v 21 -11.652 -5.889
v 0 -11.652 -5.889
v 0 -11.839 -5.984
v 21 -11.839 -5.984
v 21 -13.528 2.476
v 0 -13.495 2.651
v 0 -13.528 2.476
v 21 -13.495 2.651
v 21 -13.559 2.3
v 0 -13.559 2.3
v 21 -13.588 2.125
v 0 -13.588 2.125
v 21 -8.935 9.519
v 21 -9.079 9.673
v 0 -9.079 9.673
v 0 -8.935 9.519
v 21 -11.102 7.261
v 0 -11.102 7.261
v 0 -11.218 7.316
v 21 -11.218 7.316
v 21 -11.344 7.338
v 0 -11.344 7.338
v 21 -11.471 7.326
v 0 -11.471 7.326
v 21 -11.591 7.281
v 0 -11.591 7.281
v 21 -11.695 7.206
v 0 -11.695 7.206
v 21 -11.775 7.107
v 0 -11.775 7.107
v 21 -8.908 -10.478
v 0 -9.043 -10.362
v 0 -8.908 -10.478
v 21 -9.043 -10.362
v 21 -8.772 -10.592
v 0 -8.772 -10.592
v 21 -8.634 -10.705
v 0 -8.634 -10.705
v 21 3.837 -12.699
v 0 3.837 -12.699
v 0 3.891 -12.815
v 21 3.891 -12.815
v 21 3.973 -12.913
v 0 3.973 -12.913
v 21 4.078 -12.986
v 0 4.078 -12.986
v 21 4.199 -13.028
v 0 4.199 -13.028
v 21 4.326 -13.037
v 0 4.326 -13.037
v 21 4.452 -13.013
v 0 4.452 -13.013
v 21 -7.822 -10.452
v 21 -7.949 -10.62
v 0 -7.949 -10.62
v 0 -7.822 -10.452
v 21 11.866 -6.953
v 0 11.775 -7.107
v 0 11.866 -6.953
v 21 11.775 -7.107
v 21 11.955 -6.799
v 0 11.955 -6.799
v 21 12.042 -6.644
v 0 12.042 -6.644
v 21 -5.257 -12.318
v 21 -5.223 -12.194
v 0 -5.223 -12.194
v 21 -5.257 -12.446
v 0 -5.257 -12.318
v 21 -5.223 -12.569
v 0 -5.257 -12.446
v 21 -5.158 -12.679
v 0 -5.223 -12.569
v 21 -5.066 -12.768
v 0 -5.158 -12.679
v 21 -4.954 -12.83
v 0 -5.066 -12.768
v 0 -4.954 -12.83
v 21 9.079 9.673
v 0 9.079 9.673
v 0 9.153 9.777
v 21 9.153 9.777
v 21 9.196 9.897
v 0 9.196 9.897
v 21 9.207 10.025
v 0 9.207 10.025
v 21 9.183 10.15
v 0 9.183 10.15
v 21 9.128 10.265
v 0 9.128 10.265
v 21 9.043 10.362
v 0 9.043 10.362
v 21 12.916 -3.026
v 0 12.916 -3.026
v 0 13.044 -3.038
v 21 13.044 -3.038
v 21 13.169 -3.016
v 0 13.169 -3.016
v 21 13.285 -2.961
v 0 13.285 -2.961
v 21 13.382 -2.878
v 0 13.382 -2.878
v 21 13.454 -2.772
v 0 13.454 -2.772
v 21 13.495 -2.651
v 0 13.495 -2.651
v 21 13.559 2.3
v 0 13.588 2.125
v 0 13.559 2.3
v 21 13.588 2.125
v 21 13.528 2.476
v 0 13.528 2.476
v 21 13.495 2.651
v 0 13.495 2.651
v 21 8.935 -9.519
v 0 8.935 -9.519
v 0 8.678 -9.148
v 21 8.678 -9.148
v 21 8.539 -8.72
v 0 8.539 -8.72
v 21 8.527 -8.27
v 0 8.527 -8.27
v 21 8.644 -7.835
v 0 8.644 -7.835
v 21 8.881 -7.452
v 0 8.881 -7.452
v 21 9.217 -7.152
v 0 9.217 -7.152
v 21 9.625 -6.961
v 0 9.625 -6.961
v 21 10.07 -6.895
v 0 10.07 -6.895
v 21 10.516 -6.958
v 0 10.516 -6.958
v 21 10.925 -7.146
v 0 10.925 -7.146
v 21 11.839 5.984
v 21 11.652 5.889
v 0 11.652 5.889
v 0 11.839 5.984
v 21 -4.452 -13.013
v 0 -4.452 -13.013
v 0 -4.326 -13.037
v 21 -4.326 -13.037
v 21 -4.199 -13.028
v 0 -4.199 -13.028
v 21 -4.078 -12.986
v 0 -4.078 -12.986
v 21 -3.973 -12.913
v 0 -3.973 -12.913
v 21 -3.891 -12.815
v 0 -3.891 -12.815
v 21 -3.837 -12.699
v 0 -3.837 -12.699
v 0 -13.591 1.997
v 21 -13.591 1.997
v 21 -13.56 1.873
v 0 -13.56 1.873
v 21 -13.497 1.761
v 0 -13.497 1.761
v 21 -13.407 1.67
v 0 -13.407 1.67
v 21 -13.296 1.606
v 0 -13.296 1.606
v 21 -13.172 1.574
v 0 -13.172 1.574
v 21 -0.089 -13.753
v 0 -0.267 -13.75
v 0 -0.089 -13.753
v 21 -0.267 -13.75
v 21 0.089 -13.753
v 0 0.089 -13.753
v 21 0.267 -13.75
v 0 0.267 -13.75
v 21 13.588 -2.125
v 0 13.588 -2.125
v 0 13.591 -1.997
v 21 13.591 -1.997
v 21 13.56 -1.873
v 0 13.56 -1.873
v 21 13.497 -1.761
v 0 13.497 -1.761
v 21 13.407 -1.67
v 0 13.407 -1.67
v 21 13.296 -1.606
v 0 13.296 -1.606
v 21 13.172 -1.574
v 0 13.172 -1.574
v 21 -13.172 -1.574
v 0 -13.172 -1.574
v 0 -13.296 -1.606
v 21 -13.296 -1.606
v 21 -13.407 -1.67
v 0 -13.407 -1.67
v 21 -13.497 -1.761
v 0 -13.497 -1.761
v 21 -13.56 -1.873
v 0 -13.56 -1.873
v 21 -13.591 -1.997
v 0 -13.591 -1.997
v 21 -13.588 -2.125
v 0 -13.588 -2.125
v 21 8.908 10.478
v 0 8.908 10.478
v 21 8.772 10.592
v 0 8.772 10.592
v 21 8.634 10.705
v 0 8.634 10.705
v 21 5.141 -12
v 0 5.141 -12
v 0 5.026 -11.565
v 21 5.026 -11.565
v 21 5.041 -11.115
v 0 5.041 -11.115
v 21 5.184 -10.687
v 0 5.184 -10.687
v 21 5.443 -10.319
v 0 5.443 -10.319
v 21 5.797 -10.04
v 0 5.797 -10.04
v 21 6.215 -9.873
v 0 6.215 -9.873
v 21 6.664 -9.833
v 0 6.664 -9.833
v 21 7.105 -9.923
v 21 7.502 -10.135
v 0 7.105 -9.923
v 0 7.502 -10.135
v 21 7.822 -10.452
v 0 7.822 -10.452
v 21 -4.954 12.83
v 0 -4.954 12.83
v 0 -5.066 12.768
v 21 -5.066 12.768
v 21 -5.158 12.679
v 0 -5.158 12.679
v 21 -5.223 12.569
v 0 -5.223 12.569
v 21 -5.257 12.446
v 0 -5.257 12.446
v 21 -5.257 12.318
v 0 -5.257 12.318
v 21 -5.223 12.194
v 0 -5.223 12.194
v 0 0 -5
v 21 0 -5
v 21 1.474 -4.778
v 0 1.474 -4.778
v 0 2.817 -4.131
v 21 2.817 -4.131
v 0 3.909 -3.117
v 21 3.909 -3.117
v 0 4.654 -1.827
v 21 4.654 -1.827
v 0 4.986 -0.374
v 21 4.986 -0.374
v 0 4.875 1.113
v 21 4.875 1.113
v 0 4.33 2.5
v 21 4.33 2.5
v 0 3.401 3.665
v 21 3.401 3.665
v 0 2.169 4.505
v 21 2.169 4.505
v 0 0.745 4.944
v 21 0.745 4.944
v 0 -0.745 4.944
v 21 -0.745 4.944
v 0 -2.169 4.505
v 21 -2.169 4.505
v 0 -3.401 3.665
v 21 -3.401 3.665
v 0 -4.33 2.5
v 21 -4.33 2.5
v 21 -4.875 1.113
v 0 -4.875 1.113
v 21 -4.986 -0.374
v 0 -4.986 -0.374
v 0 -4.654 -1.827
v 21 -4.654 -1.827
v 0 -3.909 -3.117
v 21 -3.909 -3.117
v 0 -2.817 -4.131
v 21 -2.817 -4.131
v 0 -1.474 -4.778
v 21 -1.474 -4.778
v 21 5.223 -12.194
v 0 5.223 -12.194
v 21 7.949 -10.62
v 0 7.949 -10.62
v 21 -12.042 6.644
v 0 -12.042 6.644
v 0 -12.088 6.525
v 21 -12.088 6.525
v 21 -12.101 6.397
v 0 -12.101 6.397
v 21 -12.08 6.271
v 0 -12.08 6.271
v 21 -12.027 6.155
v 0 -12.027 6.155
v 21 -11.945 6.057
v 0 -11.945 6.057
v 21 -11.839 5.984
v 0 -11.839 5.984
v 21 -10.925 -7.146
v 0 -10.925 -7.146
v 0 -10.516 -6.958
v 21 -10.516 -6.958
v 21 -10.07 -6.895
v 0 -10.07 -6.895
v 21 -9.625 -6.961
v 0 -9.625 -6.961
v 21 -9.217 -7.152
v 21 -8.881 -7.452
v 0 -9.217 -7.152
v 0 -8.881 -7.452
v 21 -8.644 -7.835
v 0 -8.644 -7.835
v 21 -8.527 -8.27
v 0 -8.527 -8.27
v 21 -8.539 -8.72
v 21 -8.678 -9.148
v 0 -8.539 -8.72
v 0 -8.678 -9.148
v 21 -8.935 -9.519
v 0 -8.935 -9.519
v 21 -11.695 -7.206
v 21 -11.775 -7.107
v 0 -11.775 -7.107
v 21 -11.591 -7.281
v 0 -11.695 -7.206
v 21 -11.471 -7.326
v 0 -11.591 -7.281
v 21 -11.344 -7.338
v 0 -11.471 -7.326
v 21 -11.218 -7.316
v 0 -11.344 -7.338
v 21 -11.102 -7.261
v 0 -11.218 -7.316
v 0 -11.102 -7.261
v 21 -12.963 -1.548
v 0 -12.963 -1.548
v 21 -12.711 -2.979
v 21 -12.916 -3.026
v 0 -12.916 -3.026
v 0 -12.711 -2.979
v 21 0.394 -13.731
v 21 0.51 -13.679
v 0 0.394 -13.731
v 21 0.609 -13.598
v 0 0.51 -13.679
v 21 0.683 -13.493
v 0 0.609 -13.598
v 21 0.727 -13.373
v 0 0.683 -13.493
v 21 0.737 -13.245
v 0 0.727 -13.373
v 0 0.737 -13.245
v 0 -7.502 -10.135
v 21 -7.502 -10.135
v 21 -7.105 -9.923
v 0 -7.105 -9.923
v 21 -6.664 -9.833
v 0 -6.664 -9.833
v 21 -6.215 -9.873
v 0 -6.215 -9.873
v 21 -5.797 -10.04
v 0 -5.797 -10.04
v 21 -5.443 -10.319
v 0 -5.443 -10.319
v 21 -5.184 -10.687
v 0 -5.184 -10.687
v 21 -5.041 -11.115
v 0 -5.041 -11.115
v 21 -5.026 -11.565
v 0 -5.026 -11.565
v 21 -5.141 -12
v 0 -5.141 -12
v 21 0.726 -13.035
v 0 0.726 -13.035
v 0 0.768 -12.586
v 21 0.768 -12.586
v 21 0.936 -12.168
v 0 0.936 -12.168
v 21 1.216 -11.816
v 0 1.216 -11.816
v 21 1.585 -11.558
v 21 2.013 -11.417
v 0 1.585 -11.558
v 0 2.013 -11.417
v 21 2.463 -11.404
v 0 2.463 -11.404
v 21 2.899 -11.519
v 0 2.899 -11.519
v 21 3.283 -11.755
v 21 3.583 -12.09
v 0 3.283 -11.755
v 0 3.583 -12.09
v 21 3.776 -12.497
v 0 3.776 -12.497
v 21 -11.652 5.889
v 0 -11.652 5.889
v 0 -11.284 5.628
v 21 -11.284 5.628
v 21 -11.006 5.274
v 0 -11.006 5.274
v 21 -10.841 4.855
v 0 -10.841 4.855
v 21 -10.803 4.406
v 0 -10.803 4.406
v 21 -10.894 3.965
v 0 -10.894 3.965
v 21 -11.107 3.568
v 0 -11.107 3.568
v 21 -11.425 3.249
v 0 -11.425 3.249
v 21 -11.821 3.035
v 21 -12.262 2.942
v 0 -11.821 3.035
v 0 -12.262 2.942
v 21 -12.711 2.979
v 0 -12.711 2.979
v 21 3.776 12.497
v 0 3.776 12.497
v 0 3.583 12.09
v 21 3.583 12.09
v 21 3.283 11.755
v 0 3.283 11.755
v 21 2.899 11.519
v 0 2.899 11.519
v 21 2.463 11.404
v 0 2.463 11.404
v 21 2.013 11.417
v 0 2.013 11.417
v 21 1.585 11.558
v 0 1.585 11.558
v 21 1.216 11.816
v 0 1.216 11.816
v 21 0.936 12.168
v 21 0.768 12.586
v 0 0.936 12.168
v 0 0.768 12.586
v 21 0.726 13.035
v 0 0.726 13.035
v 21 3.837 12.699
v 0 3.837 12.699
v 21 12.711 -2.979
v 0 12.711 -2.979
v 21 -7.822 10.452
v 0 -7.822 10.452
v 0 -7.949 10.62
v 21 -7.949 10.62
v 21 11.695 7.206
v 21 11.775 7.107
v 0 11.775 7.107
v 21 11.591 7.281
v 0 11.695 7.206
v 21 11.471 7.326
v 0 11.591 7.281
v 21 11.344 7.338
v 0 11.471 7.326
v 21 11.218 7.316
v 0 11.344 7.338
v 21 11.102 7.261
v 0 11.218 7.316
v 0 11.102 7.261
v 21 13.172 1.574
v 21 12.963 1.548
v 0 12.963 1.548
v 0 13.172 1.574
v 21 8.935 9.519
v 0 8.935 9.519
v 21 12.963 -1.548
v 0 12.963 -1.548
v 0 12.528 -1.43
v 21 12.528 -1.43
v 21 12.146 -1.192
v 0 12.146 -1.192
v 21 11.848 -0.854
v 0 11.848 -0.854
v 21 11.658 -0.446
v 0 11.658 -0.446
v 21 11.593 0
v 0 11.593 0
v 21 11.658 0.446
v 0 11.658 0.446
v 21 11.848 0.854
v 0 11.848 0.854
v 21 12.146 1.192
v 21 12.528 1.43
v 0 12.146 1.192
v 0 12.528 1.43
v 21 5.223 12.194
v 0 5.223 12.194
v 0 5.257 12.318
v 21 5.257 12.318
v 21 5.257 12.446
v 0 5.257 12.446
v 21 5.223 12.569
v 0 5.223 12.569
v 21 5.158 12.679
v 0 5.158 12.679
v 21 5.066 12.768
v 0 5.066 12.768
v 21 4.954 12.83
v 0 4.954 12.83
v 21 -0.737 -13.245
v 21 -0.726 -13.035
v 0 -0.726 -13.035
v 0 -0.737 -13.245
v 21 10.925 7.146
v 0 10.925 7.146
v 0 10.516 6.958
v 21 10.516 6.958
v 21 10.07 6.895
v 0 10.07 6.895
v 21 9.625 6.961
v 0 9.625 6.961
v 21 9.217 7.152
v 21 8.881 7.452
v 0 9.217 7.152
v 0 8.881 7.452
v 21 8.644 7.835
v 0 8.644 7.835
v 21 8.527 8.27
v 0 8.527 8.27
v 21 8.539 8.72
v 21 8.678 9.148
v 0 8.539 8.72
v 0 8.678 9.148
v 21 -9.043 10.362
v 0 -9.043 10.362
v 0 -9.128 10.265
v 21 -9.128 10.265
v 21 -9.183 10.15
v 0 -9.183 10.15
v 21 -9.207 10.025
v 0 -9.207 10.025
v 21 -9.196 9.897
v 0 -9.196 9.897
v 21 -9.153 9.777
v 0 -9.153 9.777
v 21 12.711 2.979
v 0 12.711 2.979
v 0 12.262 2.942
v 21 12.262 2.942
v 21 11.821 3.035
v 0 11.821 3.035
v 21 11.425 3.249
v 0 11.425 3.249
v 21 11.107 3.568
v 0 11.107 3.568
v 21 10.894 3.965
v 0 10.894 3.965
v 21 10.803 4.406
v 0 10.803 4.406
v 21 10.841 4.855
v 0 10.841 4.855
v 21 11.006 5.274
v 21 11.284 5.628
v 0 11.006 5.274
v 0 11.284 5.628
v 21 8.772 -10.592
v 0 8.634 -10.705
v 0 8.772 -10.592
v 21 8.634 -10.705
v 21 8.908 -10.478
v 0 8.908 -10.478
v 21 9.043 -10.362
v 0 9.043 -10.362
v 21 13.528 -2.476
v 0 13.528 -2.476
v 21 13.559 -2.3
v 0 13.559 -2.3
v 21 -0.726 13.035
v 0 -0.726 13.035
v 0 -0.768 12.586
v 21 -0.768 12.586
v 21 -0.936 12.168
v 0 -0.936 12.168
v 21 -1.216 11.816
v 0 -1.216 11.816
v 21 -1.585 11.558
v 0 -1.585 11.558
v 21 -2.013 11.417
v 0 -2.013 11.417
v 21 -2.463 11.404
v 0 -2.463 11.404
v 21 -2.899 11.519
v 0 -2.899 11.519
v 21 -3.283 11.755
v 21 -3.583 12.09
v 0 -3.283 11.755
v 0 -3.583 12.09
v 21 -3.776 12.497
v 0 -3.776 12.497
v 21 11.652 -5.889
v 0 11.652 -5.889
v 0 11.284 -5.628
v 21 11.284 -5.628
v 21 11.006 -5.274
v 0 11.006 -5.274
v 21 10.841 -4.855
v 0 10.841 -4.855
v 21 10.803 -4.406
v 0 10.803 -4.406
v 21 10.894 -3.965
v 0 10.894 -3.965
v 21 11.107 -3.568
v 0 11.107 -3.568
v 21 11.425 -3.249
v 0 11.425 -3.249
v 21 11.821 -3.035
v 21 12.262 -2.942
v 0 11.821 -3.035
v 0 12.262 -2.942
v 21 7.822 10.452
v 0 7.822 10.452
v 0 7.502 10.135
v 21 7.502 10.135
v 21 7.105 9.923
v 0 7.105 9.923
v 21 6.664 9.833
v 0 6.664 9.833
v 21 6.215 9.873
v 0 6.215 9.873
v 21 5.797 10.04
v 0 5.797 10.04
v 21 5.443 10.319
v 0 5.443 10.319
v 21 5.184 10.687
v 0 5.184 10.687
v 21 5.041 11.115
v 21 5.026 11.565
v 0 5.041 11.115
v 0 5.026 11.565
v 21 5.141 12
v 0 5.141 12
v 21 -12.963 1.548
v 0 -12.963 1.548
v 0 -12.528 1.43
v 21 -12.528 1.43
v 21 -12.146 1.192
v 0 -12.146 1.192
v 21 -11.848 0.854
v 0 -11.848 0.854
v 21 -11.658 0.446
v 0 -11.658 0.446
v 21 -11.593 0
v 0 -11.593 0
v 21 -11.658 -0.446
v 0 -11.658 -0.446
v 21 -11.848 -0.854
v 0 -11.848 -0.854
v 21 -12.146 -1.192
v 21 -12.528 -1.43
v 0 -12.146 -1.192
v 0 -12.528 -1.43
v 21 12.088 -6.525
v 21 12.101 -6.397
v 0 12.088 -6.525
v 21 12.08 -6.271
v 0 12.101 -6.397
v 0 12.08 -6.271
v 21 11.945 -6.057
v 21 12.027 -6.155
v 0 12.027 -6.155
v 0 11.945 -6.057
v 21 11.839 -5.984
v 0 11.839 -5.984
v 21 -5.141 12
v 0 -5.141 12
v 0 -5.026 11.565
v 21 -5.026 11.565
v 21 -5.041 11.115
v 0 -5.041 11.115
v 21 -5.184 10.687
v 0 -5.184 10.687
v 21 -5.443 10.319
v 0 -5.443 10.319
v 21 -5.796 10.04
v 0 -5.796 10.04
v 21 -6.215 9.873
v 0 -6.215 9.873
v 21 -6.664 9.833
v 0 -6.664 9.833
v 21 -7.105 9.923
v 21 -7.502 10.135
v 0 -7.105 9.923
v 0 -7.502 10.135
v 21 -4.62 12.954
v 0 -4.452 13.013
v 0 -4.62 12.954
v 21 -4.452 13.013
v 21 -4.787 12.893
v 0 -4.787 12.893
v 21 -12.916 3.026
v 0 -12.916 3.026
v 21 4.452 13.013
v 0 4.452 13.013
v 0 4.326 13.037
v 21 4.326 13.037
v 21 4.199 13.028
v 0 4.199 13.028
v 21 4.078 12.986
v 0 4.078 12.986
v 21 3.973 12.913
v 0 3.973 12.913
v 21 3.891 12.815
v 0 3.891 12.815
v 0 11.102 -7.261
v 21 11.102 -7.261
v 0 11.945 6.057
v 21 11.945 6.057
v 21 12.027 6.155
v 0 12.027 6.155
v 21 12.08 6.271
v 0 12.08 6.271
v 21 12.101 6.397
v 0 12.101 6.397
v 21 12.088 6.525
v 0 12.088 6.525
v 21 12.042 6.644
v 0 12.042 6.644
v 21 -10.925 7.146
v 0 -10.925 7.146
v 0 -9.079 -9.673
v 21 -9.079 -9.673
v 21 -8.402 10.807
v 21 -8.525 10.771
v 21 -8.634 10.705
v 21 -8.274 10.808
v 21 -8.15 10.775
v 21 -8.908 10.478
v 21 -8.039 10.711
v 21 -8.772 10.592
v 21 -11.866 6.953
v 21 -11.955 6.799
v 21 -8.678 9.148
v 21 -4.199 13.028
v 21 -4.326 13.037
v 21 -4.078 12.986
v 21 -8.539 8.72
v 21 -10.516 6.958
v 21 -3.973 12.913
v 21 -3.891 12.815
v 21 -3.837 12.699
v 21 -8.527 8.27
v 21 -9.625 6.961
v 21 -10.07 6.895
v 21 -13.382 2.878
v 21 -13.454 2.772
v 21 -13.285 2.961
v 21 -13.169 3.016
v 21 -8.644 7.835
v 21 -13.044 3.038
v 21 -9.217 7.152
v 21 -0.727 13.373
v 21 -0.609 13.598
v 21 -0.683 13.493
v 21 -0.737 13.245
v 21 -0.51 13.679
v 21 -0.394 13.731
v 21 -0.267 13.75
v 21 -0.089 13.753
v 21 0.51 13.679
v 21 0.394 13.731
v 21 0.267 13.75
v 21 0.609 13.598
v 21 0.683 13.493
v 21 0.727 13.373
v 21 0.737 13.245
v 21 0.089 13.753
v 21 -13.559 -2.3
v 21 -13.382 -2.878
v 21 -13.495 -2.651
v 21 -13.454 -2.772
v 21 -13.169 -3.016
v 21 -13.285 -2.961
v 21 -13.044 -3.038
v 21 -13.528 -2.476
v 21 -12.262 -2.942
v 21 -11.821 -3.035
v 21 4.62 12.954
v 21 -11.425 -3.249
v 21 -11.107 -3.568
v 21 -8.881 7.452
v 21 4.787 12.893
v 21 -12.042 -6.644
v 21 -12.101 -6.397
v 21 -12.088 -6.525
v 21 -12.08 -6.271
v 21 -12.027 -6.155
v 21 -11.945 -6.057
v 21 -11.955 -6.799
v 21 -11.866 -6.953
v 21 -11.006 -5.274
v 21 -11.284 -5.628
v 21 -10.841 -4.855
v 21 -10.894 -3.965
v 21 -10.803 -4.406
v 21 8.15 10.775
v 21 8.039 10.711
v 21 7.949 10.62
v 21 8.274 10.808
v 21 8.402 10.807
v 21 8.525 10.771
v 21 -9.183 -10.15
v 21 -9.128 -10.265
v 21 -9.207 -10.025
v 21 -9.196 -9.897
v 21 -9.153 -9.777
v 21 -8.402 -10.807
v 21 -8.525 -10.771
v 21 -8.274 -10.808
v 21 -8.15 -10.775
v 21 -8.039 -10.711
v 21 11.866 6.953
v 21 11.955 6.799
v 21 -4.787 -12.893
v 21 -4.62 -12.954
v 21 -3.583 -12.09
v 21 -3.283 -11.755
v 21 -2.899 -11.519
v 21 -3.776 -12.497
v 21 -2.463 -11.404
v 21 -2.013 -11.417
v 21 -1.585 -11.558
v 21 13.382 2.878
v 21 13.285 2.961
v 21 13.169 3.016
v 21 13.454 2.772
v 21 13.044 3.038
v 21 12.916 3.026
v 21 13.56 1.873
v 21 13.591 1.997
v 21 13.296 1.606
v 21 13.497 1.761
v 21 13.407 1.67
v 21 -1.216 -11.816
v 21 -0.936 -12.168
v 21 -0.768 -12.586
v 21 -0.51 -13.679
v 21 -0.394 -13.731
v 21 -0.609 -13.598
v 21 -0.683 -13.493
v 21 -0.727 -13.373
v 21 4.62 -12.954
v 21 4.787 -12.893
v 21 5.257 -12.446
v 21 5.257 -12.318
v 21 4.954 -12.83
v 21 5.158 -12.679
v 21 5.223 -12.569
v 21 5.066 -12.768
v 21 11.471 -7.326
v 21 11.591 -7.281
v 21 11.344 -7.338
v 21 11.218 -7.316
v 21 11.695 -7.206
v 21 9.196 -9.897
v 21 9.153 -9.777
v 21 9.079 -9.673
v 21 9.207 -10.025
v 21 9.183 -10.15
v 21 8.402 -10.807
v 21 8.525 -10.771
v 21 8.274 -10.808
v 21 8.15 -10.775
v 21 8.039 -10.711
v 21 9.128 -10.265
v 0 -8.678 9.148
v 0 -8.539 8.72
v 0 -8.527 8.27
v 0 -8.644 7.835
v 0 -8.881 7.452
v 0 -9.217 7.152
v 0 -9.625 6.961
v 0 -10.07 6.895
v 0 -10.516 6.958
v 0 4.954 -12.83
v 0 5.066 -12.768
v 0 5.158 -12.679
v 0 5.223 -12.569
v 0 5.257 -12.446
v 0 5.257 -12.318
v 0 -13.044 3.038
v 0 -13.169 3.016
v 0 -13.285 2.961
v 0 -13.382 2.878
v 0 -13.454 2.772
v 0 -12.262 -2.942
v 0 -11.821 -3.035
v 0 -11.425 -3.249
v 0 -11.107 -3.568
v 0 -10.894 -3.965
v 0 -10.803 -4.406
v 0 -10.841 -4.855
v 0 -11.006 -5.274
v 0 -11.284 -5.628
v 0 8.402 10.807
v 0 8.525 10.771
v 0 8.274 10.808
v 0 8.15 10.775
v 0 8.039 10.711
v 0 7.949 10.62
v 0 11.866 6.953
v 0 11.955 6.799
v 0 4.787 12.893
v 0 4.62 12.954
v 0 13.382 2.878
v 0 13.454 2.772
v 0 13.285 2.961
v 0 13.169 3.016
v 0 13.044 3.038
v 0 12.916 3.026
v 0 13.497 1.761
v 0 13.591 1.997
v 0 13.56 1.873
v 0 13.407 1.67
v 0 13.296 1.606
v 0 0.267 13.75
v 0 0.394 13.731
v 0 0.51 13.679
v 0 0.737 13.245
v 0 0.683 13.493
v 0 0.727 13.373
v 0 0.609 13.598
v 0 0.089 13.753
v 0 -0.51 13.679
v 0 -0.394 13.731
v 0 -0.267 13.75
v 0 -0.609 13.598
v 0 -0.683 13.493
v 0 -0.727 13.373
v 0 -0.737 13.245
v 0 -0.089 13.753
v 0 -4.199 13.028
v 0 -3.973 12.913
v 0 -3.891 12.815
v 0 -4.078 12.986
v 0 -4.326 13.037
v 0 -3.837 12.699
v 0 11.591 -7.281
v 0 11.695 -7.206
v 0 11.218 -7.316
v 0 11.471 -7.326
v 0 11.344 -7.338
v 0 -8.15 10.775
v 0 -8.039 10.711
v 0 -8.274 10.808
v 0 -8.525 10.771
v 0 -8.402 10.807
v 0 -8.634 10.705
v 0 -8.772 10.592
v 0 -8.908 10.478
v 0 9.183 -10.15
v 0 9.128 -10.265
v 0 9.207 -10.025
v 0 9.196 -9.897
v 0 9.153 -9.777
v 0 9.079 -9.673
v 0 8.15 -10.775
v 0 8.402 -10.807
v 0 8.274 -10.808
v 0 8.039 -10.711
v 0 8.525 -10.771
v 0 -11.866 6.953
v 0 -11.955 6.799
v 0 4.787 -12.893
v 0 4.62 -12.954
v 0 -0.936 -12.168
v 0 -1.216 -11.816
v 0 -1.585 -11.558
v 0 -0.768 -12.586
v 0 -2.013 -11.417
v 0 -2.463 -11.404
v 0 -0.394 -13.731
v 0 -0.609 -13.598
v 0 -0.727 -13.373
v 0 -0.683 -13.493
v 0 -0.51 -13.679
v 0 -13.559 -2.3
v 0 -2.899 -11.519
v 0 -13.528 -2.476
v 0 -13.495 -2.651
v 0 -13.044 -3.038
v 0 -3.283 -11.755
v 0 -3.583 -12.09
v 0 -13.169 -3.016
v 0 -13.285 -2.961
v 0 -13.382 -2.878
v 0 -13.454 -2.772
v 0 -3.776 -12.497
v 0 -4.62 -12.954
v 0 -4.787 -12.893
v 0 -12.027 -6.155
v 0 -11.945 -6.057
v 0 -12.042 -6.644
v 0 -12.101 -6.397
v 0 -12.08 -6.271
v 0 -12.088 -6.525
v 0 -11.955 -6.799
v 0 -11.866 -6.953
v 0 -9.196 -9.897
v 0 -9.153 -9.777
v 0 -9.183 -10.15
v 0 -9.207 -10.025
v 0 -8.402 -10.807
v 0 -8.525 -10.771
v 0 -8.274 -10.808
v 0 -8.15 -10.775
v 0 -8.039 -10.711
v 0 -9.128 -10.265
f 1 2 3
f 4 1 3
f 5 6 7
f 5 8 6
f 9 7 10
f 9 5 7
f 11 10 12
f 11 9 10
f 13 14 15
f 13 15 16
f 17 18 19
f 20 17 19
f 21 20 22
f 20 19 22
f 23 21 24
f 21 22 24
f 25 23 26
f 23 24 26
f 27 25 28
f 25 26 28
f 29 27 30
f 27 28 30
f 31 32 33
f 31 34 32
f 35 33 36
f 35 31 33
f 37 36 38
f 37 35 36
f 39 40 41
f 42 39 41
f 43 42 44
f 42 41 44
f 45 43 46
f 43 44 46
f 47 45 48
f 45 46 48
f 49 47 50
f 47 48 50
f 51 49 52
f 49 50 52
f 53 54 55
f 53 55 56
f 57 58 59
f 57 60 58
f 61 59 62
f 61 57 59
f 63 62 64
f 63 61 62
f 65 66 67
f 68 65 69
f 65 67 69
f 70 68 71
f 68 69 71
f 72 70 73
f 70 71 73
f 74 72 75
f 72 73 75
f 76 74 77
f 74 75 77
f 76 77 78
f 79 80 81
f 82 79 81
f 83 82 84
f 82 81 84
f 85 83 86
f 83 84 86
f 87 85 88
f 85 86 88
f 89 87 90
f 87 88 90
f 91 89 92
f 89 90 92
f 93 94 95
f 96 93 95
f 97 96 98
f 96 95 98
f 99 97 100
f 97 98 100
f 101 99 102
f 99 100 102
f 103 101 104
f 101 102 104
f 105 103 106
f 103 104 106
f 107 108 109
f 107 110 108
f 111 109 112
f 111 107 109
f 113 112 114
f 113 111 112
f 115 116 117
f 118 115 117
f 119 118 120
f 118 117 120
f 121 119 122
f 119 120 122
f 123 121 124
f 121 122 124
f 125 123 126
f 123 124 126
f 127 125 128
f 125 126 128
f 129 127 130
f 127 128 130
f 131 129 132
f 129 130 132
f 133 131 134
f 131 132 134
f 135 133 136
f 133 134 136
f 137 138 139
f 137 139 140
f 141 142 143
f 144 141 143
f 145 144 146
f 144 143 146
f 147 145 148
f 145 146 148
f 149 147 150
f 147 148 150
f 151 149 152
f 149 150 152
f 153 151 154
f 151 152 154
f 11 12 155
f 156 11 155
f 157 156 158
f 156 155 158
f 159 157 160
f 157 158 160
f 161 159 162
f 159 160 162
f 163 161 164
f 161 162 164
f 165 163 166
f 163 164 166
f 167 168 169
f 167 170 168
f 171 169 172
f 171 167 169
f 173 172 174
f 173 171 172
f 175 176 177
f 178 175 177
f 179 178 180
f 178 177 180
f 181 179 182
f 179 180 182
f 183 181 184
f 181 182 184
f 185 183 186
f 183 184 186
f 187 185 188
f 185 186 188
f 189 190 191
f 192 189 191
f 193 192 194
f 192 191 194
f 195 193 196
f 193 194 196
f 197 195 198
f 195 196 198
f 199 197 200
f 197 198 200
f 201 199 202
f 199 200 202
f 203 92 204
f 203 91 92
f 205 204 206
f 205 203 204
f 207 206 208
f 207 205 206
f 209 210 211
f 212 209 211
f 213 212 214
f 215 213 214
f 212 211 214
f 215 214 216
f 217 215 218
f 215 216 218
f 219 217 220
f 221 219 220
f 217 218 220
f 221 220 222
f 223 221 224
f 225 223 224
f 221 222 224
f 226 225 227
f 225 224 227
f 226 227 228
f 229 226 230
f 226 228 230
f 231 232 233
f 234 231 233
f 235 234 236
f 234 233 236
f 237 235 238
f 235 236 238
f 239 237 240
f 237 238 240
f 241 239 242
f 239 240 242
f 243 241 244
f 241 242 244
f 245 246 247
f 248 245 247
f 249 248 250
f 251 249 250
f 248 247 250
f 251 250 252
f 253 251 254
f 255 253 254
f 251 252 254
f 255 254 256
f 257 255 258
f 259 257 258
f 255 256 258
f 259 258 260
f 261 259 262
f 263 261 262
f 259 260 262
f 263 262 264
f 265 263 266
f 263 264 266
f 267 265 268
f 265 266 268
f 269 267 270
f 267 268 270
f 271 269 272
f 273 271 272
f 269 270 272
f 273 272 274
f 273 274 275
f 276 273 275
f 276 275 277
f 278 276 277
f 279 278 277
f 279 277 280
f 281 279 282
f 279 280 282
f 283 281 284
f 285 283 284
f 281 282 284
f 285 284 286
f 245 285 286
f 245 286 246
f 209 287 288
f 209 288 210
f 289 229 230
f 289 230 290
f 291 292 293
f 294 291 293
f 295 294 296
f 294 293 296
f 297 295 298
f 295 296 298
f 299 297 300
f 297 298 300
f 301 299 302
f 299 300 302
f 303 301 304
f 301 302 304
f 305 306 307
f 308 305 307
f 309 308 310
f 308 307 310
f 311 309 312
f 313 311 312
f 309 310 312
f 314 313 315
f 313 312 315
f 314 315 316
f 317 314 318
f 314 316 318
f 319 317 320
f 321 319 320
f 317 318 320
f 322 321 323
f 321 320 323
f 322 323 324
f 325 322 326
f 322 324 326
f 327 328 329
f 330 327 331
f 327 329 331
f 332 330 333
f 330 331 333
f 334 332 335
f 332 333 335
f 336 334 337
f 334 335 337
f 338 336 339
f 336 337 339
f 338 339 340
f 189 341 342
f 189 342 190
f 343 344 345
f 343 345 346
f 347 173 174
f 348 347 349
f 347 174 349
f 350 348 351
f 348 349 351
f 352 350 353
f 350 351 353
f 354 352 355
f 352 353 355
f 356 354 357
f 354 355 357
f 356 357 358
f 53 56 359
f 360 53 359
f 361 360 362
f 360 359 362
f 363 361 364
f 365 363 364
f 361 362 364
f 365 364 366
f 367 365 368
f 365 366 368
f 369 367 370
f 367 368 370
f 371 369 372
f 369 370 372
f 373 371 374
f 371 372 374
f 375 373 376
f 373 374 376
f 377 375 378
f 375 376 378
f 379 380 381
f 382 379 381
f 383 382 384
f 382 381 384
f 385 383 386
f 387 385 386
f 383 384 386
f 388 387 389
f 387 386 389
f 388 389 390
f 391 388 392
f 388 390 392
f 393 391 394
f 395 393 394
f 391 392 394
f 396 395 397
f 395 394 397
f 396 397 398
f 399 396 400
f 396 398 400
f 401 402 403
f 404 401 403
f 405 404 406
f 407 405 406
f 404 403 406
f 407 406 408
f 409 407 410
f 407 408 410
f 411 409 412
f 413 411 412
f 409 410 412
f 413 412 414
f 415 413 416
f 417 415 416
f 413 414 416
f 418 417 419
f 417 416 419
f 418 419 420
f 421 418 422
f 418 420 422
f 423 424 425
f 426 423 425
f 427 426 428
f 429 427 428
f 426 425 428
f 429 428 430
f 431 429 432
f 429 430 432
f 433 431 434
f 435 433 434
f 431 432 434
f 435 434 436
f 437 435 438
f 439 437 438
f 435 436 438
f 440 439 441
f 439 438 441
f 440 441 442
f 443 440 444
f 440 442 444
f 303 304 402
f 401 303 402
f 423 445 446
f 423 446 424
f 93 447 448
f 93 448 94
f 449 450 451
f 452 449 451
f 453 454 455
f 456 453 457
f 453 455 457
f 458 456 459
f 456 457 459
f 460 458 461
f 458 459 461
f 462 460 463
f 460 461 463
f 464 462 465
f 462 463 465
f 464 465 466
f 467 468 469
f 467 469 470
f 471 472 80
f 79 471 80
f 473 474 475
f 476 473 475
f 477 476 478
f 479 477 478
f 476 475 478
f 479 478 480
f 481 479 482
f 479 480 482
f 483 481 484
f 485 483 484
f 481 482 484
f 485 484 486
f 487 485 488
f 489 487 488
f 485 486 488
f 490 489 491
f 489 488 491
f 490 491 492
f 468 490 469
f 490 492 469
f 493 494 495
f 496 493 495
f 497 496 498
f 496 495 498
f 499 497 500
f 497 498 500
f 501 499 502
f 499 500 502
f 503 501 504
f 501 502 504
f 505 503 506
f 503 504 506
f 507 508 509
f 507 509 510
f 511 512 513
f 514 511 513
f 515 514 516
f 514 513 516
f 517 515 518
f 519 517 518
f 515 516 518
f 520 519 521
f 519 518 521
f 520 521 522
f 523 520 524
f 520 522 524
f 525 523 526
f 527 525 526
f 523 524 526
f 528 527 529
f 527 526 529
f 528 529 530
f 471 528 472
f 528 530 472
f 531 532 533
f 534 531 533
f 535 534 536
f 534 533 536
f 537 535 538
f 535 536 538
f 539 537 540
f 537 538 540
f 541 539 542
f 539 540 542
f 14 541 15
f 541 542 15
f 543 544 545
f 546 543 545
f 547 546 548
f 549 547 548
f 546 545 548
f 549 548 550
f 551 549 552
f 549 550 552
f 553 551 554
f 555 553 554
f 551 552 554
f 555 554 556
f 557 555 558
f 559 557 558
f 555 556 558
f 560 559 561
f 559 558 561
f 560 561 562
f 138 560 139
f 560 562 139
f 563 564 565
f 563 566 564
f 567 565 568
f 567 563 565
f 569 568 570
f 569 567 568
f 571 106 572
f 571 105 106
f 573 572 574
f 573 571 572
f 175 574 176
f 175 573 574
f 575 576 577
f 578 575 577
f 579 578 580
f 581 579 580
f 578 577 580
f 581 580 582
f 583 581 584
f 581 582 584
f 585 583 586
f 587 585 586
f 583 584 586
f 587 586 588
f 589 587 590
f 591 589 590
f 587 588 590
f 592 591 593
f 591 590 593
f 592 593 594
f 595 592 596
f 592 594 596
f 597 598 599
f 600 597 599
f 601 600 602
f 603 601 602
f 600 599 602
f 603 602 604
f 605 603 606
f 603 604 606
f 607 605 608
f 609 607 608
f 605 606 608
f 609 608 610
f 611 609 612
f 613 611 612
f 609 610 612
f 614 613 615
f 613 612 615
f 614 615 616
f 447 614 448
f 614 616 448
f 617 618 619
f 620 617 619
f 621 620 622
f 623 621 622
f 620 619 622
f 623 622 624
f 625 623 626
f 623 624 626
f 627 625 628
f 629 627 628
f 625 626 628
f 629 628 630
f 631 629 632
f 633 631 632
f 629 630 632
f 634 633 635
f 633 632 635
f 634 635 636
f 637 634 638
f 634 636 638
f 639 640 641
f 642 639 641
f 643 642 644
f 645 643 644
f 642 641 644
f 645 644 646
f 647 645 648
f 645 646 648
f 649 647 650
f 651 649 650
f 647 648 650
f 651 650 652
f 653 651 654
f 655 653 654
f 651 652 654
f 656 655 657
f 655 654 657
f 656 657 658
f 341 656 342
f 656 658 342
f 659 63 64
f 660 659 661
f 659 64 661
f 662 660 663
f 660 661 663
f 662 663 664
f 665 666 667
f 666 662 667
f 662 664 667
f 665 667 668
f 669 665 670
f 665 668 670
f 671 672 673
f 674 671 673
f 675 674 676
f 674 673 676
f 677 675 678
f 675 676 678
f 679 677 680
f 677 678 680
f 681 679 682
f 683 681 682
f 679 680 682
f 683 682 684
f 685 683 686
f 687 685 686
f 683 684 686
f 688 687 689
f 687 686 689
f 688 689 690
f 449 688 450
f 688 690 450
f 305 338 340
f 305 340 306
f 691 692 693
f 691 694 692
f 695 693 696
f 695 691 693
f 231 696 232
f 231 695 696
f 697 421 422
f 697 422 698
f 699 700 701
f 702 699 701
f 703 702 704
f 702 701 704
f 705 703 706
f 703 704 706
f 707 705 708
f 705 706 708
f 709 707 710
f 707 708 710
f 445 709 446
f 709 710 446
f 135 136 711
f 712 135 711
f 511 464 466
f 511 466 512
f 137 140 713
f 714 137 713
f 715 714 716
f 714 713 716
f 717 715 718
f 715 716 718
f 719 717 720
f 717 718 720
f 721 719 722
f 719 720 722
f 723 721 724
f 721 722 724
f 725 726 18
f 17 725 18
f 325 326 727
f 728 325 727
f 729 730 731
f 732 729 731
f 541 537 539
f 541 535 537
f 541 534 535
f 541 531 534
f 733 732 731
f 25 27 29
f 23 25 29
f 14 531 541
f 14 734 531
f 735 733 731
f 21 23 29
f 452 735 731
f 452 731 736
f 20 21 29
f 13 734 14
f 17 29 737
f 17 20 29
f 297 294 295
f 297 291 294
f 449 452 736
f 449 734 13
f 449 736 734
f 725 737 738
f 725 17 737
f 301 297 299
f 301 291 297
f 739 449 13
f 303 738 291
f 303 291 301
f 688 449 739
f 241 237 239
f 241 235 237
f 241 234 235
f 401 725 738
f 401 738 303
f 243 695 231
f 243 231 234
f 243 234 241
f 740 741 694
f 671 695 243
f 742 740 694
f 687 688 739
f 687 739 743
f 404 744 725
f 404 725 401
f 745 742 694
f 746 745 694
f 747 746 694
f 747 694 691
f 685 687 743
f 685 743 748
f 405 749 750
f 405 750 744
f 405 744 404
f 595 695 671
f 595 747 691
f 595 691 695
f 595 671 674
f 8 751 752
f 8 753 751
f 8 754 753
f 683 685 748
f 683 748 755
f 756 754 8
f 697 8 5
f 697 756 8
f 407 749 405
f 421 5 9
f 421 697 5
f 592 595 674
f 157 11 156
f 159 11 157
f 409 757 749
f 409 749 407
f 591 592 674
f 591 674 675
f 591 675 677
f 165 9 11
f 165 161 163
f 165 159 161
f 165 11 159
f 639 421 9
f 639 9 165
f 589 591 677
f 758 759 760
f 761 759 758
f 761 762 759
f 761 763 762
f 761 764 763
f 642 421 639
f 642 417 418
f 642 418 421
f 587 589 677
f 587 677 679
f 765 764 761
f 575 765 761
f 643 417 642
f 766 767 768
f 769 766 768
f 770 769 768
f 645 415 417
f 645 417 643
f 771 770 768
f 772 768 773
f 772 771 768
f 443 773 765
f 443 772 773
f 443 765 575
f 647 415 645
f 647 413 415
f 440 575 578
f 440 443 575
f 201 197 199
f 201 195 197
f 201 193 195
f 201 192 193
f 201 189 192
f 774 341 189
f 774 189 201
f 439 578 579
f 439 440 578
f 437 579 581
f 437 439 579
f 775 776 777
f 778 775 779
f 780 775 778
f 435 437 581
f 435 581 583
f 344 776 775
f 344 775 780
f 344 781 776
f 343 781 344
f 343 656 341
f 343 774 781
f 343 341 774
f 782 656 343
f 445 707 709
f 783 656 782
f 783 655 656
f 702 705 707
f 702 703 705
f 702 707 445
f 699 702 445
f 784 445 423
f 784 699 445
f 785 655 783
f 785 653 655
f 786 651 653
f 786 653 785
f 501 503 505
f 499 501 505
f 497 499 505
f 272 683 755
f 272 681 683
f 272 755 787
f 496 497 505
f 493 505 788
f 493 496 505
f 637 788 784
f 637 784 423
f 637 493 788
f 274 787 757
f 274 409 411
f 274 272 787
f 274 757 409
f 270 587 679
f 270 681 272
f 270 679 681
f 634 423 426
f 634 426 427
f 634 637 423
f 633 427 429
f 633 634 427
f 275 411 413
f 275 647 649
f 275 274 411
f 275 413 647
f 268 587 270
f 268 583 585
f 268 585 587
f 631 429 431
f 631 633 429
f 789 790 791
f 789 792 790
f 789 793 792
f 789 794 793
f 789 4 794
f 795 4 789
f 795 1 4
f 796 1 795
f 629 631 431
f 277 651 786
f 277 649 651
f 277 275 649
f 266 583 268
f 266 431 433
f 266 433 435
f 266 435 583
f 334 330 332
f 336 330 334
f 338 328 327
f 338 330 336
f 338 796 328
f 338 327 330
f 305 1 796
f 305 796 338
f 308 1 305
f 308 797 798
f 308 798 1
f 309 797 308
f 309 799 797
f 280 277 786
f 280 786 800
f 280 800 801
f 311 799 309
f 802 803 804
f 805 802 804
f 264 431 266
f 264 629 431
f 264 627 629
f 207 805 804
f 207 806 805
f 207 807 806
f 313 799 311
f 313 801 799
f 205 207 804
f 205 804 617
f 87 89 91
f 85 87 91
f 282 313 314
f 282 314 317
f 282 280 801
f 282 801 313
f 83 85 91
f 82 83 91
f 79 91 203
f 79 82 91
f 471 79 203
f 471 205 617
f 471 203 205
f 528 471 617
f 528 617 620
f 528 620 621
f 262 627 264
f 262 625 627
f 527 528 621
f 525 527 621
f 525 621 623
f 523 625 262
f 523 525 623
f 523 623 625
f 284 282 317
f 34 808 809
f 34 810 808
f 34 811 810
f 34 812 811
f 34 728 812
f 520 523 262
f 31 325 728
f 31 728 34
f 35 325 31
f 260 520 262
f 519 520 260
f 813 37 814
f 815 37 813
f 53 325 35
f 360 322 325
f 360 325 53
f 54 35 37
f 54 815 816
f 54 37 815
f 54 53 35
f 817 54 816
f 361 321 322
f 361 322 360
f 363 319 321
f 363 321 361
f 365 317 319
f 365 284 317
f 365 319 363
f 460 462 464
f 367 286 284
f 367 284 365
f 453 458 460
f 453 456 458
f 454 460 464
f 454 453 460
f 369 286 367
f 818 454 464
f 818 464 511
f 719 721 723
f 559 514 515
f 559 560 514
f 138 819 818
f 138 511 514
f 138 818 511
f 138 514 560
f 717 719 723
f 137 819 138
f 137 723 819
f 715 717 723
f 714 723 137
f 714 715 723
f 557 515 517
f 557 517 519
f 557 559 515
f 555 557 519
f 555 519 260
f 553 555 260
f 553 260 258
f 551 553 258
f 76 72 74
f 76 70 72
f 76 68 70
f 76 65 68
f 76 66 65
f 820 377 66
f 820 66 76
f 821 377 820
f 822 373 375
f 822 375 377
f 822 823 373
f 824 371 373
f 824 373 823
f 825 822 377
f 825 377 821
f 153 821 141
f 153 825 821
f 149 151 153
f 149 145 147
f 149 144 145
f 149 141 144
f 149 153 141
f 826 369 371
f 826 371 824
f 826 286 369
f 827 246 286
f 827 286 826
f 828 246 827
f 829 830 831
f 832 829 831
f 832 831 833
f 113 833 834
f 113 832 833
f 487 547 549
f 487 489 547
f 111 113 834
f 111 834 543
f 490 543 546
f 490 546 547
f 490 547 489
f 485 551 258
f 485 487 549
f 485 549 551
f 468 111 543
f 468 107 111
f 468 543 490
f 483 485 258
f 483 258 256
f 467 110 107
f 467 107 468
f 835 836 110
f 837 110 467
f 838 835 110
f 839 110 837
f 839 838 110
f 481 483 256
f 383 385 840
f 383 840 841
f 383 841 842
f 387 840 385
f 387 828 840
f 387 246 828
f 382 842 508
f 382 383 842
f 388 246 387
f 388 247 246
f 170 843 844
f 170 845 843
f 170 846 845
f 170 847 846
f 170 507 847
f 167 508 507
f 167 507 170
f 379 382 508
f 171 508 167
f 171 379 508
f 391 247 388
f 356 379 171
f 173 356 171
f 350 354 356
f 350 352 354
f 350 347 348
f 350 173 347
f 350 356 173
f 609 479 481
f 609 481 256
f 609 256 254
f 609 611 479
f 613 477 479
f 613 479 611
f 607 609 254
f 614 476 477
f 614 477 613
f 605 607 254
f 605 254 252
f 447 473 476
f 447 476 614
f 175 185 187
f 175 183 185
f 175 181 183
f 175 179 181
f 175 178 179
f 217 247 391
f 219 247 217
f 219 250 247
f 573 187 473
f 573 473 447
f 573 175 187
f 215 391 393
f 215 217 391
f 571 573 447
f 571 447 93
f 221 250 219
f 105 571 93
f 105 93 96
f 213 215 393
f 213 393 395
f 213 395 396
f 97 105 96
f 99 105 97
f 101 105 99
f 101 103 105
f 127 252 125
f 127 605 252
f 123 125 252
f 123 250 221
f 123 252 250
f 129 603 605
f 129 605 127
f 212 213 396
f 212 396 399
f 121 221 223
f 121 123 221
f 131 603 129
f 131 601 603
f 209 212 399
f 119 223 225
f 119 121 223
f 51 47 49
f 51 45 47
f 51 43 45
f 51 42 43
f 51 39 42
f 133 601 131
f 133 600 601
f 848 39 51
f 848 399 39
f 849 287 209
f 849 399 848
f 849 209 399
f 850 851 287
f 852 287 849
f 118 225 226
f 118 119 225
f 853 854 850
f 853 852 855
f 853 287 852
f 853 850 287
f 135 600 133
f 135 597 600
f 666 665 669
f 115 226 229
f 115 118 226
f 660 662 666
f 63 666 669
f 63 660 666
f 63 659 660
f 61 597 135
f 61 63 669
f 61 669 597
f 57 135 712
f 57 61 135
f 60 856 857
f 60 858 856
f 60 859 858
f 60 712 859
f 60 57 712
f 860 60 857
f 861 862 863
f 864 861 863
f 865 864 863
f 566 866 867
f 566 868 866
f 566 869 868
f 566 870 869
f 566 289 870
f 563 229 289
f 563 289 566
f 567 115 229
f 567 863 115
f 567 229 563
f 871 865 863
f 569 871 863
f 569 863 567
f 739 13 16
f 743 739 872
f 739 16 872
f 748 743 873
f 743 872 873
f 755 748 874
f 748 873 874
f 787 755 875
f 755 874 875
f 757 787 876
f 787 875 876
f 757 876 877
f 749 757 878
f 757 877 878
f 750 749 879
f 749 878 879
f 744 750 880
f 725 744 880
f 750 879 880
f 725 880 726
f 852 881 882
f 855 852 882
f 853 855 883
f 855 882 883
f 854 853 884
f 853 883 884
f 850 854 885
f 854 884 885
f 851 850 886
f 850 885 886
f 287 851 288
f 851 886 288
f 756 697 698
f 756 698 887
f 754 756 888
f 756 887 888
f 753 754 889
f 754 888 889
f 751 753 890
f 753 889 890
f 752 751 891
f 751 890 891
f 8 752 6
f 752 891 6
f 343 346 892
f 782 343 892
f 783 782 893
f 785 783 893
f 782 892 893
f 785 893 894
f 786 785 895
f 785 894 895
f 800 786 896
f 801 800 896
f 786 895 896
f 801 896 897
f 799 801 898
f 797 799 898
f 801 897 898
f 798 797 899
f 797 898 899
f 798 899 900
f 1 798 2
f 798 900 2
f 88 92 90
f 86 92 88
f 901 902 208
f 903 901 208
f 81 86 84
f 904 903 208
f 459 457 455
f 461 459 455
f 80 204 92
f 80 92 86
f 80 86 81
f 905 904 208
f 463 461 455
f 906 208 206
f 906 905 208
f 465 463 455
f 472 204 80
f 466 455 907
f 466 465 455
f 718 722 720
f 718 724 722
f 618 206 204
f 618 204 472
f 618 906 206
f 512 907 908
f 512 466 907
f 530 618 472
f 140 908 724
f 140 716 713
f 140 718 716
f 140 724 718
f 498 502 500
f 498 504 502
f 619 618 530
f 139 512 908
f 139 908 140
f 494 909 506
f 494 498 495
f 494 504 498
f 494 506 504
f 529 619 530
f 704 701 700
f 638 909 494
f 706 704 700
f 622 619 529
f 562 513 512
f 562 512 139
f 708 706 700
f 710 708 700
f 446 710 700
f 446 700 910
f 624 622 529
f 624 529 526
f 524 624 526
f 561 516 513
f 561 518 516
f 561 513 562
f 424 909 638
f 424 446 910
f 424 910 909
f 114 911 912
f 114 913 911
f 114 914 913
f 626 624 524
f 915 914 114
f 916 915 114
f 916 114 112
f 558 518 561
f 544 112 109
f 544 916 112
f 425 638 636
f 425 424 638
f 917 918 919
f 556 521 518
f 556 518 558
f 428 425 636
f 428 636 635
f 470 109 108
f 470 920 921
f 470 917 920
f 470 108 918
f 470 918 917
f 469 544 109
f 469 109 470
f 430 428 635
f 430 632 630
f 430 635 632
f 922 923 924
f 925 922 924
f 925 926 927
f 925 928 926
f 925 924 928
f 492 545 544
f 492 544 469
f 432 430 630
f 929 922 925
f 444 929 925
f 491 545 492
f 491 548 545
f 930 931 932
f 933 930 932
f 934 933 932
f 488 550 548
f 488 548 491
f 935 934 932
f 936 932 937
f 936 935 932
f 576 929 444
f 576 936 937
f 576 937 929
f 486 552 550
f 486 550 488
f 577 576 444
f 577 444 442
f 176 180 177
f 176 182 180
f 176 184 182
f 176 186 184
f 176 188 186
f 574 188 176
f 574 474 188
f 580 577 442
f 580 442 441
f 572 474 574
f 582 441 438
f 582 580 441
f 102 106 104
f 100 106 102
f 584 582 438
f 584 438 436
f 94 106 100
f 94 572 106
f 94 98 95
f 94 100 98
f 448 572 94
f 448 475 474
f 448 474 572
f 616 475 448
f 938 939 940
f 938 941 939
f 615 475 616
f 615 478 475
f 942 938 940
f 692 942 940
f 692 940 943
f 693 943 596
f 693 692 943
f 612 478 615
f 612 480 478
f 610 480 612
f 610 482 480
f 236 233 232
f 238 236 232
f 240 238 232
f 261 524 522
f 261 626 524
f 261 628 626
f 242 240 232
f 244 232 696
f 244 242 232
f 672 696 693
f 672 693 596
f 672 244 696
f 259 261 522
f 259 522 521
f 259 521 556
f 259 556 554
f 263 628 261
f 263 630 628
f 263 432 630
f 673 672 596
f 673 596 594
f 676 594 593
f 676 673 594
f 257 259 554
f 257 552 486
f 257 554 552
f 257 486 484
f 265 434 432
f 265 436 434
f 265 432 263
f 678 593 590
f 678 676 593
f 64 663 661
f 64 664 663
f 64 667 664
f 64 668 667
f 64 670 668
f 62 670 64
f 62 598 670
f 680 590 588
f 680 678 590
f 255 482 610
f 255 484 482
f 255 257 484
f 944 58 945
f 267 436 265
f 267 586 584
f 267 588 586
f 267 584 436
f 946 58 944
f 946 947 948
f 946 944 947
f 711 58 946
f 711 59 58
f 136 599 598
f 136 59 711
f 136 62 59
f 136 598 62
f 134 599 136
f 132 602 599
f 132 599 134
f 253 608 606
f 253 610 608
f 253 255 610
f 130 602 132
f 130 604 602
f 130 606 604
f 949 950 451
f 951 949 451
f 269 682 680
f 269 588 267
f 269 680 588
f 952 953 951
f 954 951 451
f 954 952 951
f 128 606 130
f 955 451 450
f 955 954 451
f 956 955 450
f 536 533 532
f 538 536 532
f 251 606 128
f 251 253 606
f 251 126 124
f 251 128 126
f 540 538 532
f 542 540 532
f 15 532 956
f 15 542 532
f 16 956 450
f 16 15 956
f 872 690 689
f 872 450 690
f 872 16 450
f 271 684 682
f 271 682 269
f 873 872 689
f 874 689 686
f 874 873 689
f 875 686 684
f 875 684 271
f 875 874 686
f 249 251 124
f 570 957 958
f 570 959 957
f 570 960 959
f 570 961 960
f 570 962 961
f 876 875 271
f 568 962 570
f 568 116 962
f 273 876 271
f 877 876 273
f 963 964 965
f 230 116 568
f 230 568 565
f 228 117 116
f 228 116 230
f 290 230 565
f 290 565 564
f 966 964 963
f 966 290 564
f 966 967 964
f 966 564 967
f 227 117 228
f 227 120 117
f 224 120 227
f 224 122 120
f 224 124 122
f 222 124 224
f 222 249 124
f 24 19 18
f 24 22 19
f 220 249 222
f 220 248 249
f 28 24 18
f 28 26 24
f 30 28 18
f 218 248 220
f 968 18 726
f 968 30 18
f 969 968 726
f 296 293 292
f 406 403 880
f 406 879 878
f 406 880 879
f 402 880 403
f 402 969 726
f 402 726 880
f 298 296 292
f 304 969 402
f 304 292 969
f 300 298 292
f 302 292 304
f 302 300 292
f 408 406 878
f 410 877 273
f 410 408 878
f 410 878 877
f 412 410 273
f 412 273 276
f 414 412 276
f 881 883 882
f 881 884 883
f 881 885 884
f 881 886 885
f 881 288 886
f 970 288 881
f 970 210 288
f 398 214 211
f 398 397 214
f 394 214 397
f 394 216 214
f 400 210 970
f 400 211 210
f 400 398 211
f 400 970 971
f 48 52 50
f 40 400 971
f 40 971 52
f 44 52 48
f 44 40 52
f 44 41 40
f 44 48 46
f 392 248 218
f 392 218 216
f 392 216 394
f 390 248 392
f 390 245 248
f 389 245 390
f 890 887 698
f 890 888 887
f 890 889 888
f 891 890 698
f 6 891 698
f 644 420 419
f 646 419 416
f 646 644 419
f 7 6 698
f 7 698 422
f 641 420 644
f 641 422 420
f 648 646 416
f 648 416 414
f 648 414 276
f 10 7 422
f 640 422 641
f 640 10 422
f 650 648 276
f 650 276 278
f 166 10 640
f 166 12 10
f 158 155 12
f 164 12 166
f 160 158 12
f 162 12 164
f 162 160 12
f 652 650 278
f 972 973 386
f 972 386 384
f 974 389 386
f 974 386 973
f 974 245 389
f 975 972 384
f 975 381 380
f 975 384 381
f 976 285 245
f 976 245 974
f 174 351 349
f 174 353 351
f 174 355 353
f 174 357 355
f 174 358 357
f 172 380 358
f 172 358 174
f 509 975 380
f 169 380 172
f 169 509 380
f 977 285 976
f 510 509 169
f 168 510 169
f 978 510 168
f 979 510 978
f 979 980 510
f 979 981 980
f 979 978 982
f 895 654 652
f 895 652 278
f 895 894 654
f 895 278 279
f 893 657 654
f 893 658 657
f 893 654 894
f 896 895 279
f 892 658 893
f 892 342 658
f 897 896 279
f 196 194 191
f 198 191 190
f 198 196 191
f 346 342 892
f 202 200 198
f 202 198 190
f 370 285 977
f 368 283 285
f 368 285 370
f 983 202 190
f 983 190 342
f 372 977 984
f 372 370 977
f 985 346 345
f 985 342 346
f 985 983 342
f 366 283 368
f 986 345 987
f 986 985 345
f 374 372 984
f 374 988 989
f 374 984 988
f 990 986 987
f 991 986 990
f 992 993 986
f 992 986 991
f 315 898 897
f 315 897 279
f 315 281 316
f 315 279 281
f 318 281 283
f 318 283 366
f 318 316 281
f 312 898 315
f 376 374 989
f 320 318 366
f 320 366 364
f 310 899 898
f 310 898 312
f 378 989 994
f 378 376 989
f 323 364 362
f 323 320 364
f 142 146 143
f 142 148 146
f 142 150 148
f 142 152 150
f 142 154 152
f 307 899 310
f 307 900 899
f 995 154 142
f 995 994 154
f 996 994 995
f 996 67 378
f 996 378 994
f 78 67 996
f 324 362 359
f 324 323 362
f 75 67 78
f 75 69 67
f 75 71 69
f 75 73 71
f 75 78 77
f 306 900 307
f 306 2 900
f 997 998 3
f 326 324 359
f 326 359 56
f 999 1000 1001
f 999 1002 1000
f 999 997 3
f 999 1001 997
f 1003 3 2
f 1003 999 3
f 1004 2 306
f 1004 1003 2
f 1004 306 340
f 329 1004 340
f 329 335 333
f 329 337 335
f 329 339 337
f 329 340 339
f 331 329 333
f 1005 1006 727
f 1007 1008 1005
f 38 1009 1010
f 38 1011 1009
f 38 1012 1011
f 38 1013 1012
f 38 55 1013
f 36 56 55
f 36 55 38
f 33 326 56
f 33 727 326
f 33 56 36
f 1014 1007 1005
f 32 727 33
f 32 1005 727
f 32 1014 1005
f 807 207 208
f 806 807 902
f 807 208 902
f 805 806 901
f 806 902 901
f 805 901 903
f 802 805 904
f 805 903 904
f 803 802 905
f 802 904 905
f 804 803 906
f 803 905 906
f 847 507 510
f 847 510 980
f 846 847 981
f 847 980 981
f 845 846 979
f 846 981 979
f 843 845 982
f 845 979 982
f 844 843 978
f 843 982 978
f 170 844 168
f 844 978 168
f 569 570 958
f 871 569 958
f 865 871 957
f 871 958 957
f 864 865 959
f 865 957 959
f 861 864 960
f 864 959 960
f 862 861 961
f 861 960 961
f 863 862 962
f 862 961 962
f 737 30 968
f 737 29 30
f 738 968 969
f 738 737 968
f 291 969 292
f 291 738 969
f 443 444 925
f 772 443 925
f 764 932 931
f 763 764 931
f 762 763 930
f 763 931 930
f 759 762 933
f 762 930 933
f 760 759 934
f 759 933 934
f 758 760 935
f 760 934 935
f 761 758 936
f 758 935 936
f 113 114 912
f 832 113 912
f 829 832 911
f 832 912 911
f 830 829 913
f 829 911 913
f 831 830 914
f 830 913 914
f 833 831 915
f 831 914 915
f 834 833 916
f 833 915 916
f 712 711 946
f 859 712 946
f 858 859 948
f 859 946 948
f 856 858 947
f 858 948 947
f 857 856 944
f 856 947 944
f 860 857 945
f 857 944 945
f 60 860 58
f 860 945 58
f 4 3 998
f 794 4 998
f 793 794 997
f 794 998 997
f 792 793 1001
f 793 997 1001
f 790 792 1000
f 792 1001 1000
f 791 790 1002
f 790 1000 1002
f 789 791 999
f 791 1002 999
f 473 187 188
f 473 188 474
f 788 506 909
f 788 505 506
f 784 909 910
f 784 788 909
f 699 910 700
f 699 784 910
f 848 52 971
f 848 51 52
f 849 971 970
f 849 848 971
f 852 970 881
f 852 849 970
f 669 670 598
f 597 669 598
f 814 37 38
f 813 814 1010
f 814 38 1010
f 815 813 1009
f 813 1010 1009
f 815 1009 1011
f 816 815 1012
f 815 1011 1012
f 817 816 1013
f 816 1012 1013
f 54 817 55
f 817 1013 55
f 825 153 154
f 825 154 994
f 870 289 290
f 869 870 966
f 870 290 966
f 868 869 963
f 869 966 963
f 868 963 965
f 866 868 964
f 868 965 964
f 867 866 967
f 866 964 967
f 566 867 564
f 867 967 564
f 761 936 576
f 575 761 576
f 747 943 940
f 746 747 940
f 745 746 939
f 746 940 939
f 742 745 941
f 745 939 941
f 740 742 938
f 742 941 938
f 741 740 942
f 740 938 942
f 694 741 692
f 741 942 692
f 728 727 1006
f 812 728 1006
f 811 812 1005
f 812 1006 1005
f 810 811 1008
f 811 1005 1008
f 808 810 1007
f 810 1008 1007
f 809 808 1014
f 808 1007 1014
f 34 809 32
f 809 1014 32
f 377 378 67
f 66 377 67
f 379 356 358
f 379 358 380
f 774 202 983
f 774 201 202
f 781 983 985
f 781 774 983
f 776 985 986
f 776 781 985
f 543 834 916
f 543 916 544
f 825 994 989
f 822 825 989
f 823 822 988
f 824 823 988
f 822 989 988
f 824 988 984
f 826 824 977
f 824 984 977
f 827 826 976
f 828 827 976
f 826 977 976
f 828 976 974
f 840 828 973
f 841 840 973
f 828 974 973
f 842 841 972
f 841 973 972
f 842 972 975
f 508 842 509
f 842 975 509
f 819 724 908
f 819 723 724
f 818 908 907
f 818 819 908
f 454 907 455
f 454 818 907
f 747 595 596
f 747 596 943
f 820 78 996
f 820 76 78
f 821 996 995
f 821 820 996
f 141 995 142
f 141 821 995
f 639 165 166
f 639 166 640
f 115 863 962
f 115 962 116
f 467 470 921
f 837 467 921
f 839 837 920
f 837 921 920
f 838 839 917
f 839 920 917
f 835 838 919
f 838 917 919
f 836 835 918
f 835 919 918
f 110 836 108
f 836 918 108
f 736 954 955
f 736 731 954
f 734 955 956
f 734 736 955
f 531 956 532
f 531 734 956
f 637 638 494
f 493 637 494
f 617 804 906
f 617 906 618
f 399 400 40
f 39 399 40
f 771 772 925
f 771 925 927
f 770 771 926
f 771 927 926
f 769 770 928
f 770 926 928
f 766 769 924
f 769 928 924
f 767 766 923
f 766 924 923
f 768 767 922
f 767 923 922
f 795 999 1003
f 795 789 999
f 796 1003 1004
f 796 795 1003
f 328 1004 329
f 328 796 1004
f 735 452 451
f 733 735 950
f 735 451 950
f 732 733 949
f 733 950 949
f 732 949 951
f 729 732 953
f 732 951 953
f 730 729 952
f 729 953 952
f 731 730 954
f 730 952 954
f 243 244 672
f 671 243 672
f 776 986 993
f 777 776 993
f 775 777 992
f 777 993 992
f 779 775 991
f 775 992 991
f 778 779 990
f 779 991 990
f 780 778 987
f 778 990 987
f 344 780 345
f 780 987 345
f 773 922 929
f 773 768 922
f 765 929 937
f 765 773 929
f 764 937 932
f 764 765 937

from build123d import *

# Parameters (mm, degrees)
CHAMFER_1_SIZE           = 1
SKETCH_4_W               = 2
SKETCH_4_H               = 1
CUT_EXTRUDE_1_DEPTH      = 35.092374778
CUT_EXTRUDE_2_REACH      = 36.092
PATTERN_CIRCULAR_3_COUNT = 18
SKETCH_7_R               = 16.570868864
CUT_EXTRUDE_3_DEPTH      = 7
SKETCH_8_R               = 8.79239993
EXTRUDE_1_DEPTH          = 21
SKETCH_9_R               = 5
CUT_EXTRUDE_4_DEPTH      = 21


with BuildPart() as part:
    # 草图1 → 旋转1 (revolve)
    with BuildSketch(Plane.XY, mode=Mode.PRIVATE) as revolve_1_sk:
        Polygon((0, 2.7506), (0, 13.753), (28, 13.753), (28, 5.5012), (20, 5.5012), (20, 2.7506), align=None)
    revolve(revolve_1_sk.sketch.rotate(Axis((0, 0, 0), (1, 0, 0)), 90), axis=Axis((0, 0, 0), (1, 0, 0)))

    # 倒角1
    chamfer_1_edges = [part.edges().sort_by_distance(p)[0] for p in [
        (20, 0, -2.7506),
        (0, 0, -2.7506),
    ]]
    chamfer(chamfer_1_edges, length=CHAMFER_1_SIZE)

    # 草图4 → 切除-拉伸1 (cut, through all)
    with BuildSketch(Plane.ZY):
        with Locations((0, 3.062381775)):
            Rectangle(SKETCH_4_W, SKETCH_4_H)
    extrude(amount=-CUT_EXTRUDE_1_DEPTH, mode=Mode.SUBTRACT)

    # 草图6 → 切除-拉伸2 (cut, up to next)
    with BuildSketch(Plane(origin=(0, 0, 0), x_dir=(0, 0, -1), z_dir=(1, 0, 0)), mode=Mode.PRIVATE) as cut_extrude_2_sk1:
        with BuildLine():
            Line((1.574067282, 13.17215513), (1.548371997, 12.962883824))
            ThreePointArc((1.548371997, 12.962883824), (0, 11.593), (-1.548371997, 12.962883824))
            Line((-1.548371997, 12.962883824), (-1.574067282, 13.17215513))
            ThreePointArc((-1.574067282, 13.17215513), (-1.761240253, 13.496717776), (-2.124642597, 13.587895453))
            ThreePointArc((-2.124642597, 13.587895453), (-2.36143787, 13.548749765), (-2.597513963, 13.505477785))
            Line((-2.597513963, 13.505477785), (-2.794161951, 15.107047128))
            ThreePointArc((-2.794161951, 15.107047128), (0, 15.363274844), (2.794161951, 15.107047128))
            Line((2.794161951, 15.107047128), (2.597513963, 13.505477785))
            ThreePointArc((2.597513963, 13.505477785), (2.36143787, 13.548749765), (2.124642597, 13.587895453))
            ThreePointArc((2.124642597, 13.587895453), (1.761240253, 13.496717776), (1.574067282, 13.17215513))
        make_face()
    cut_extrude_2_tool1 = extrude(cut_extrude_2_sk1.sketch, amount=CUT_EXTRUDE_2_REACH, mode=Mode.PRIVATE) & part.part
    cut_extrude_2 = cut_extrude_2_tool1.solids().sort_by_distance((0, 13.819423, 0))[0]
    add(cut_extrude_2, mode=Mode.SUBTRACT)

    # 阵列(圆周)3: 切除-拉伸2 ×18 about axis
    pattern_circular_3_axis = Axis((0, 0, 0), (1, 0, 0))
    for i in range(1, PATTERN_CIRCULAR_3_COUNT):
        add(cut_extrude_2.rotate(pattern_circular_3_axis, i * 360 / PATTERN_CIRCULAR_3_COUNT), mode=Mode.SUBTRACT)

    # 草图7 → 切除-拉伸3 (cut)
    with BuildSketch(Plane(origin=(28, 0, 0), x_dir=(0, 0, -1), z_dir=(1, 0, 0))):
        Circle(SKETCH_7_R)
    extrude(amount=-CUT_EXTRUDE_3_DEPTH, mode=Mode.SUBTRACT)

    # 草图8 → 凸台-拉伸1 (add)
    with BuildSketch(Plane(origin=(21, 0, 0), x_dir=(0, 0, -1), z_dir=(1, 0, 0))):
        Circle(SKETCH_8_R)
    extrude(amount=-EXTRUDE_1_DEPTH)

    # 草图9 → 切除-拉伸4 (cut)
    with BuildSketch(Plane(origin=(21, 0, 0), x_dir=(0, 0, -1), z_dir=(1, 0, 0))):
        Circle(SKETCH_9_R)
    extrude(amount=-CUT_EXTRUDE_4_DEPTH, mode=Mode.SUBTRACT)


solid = part.part
